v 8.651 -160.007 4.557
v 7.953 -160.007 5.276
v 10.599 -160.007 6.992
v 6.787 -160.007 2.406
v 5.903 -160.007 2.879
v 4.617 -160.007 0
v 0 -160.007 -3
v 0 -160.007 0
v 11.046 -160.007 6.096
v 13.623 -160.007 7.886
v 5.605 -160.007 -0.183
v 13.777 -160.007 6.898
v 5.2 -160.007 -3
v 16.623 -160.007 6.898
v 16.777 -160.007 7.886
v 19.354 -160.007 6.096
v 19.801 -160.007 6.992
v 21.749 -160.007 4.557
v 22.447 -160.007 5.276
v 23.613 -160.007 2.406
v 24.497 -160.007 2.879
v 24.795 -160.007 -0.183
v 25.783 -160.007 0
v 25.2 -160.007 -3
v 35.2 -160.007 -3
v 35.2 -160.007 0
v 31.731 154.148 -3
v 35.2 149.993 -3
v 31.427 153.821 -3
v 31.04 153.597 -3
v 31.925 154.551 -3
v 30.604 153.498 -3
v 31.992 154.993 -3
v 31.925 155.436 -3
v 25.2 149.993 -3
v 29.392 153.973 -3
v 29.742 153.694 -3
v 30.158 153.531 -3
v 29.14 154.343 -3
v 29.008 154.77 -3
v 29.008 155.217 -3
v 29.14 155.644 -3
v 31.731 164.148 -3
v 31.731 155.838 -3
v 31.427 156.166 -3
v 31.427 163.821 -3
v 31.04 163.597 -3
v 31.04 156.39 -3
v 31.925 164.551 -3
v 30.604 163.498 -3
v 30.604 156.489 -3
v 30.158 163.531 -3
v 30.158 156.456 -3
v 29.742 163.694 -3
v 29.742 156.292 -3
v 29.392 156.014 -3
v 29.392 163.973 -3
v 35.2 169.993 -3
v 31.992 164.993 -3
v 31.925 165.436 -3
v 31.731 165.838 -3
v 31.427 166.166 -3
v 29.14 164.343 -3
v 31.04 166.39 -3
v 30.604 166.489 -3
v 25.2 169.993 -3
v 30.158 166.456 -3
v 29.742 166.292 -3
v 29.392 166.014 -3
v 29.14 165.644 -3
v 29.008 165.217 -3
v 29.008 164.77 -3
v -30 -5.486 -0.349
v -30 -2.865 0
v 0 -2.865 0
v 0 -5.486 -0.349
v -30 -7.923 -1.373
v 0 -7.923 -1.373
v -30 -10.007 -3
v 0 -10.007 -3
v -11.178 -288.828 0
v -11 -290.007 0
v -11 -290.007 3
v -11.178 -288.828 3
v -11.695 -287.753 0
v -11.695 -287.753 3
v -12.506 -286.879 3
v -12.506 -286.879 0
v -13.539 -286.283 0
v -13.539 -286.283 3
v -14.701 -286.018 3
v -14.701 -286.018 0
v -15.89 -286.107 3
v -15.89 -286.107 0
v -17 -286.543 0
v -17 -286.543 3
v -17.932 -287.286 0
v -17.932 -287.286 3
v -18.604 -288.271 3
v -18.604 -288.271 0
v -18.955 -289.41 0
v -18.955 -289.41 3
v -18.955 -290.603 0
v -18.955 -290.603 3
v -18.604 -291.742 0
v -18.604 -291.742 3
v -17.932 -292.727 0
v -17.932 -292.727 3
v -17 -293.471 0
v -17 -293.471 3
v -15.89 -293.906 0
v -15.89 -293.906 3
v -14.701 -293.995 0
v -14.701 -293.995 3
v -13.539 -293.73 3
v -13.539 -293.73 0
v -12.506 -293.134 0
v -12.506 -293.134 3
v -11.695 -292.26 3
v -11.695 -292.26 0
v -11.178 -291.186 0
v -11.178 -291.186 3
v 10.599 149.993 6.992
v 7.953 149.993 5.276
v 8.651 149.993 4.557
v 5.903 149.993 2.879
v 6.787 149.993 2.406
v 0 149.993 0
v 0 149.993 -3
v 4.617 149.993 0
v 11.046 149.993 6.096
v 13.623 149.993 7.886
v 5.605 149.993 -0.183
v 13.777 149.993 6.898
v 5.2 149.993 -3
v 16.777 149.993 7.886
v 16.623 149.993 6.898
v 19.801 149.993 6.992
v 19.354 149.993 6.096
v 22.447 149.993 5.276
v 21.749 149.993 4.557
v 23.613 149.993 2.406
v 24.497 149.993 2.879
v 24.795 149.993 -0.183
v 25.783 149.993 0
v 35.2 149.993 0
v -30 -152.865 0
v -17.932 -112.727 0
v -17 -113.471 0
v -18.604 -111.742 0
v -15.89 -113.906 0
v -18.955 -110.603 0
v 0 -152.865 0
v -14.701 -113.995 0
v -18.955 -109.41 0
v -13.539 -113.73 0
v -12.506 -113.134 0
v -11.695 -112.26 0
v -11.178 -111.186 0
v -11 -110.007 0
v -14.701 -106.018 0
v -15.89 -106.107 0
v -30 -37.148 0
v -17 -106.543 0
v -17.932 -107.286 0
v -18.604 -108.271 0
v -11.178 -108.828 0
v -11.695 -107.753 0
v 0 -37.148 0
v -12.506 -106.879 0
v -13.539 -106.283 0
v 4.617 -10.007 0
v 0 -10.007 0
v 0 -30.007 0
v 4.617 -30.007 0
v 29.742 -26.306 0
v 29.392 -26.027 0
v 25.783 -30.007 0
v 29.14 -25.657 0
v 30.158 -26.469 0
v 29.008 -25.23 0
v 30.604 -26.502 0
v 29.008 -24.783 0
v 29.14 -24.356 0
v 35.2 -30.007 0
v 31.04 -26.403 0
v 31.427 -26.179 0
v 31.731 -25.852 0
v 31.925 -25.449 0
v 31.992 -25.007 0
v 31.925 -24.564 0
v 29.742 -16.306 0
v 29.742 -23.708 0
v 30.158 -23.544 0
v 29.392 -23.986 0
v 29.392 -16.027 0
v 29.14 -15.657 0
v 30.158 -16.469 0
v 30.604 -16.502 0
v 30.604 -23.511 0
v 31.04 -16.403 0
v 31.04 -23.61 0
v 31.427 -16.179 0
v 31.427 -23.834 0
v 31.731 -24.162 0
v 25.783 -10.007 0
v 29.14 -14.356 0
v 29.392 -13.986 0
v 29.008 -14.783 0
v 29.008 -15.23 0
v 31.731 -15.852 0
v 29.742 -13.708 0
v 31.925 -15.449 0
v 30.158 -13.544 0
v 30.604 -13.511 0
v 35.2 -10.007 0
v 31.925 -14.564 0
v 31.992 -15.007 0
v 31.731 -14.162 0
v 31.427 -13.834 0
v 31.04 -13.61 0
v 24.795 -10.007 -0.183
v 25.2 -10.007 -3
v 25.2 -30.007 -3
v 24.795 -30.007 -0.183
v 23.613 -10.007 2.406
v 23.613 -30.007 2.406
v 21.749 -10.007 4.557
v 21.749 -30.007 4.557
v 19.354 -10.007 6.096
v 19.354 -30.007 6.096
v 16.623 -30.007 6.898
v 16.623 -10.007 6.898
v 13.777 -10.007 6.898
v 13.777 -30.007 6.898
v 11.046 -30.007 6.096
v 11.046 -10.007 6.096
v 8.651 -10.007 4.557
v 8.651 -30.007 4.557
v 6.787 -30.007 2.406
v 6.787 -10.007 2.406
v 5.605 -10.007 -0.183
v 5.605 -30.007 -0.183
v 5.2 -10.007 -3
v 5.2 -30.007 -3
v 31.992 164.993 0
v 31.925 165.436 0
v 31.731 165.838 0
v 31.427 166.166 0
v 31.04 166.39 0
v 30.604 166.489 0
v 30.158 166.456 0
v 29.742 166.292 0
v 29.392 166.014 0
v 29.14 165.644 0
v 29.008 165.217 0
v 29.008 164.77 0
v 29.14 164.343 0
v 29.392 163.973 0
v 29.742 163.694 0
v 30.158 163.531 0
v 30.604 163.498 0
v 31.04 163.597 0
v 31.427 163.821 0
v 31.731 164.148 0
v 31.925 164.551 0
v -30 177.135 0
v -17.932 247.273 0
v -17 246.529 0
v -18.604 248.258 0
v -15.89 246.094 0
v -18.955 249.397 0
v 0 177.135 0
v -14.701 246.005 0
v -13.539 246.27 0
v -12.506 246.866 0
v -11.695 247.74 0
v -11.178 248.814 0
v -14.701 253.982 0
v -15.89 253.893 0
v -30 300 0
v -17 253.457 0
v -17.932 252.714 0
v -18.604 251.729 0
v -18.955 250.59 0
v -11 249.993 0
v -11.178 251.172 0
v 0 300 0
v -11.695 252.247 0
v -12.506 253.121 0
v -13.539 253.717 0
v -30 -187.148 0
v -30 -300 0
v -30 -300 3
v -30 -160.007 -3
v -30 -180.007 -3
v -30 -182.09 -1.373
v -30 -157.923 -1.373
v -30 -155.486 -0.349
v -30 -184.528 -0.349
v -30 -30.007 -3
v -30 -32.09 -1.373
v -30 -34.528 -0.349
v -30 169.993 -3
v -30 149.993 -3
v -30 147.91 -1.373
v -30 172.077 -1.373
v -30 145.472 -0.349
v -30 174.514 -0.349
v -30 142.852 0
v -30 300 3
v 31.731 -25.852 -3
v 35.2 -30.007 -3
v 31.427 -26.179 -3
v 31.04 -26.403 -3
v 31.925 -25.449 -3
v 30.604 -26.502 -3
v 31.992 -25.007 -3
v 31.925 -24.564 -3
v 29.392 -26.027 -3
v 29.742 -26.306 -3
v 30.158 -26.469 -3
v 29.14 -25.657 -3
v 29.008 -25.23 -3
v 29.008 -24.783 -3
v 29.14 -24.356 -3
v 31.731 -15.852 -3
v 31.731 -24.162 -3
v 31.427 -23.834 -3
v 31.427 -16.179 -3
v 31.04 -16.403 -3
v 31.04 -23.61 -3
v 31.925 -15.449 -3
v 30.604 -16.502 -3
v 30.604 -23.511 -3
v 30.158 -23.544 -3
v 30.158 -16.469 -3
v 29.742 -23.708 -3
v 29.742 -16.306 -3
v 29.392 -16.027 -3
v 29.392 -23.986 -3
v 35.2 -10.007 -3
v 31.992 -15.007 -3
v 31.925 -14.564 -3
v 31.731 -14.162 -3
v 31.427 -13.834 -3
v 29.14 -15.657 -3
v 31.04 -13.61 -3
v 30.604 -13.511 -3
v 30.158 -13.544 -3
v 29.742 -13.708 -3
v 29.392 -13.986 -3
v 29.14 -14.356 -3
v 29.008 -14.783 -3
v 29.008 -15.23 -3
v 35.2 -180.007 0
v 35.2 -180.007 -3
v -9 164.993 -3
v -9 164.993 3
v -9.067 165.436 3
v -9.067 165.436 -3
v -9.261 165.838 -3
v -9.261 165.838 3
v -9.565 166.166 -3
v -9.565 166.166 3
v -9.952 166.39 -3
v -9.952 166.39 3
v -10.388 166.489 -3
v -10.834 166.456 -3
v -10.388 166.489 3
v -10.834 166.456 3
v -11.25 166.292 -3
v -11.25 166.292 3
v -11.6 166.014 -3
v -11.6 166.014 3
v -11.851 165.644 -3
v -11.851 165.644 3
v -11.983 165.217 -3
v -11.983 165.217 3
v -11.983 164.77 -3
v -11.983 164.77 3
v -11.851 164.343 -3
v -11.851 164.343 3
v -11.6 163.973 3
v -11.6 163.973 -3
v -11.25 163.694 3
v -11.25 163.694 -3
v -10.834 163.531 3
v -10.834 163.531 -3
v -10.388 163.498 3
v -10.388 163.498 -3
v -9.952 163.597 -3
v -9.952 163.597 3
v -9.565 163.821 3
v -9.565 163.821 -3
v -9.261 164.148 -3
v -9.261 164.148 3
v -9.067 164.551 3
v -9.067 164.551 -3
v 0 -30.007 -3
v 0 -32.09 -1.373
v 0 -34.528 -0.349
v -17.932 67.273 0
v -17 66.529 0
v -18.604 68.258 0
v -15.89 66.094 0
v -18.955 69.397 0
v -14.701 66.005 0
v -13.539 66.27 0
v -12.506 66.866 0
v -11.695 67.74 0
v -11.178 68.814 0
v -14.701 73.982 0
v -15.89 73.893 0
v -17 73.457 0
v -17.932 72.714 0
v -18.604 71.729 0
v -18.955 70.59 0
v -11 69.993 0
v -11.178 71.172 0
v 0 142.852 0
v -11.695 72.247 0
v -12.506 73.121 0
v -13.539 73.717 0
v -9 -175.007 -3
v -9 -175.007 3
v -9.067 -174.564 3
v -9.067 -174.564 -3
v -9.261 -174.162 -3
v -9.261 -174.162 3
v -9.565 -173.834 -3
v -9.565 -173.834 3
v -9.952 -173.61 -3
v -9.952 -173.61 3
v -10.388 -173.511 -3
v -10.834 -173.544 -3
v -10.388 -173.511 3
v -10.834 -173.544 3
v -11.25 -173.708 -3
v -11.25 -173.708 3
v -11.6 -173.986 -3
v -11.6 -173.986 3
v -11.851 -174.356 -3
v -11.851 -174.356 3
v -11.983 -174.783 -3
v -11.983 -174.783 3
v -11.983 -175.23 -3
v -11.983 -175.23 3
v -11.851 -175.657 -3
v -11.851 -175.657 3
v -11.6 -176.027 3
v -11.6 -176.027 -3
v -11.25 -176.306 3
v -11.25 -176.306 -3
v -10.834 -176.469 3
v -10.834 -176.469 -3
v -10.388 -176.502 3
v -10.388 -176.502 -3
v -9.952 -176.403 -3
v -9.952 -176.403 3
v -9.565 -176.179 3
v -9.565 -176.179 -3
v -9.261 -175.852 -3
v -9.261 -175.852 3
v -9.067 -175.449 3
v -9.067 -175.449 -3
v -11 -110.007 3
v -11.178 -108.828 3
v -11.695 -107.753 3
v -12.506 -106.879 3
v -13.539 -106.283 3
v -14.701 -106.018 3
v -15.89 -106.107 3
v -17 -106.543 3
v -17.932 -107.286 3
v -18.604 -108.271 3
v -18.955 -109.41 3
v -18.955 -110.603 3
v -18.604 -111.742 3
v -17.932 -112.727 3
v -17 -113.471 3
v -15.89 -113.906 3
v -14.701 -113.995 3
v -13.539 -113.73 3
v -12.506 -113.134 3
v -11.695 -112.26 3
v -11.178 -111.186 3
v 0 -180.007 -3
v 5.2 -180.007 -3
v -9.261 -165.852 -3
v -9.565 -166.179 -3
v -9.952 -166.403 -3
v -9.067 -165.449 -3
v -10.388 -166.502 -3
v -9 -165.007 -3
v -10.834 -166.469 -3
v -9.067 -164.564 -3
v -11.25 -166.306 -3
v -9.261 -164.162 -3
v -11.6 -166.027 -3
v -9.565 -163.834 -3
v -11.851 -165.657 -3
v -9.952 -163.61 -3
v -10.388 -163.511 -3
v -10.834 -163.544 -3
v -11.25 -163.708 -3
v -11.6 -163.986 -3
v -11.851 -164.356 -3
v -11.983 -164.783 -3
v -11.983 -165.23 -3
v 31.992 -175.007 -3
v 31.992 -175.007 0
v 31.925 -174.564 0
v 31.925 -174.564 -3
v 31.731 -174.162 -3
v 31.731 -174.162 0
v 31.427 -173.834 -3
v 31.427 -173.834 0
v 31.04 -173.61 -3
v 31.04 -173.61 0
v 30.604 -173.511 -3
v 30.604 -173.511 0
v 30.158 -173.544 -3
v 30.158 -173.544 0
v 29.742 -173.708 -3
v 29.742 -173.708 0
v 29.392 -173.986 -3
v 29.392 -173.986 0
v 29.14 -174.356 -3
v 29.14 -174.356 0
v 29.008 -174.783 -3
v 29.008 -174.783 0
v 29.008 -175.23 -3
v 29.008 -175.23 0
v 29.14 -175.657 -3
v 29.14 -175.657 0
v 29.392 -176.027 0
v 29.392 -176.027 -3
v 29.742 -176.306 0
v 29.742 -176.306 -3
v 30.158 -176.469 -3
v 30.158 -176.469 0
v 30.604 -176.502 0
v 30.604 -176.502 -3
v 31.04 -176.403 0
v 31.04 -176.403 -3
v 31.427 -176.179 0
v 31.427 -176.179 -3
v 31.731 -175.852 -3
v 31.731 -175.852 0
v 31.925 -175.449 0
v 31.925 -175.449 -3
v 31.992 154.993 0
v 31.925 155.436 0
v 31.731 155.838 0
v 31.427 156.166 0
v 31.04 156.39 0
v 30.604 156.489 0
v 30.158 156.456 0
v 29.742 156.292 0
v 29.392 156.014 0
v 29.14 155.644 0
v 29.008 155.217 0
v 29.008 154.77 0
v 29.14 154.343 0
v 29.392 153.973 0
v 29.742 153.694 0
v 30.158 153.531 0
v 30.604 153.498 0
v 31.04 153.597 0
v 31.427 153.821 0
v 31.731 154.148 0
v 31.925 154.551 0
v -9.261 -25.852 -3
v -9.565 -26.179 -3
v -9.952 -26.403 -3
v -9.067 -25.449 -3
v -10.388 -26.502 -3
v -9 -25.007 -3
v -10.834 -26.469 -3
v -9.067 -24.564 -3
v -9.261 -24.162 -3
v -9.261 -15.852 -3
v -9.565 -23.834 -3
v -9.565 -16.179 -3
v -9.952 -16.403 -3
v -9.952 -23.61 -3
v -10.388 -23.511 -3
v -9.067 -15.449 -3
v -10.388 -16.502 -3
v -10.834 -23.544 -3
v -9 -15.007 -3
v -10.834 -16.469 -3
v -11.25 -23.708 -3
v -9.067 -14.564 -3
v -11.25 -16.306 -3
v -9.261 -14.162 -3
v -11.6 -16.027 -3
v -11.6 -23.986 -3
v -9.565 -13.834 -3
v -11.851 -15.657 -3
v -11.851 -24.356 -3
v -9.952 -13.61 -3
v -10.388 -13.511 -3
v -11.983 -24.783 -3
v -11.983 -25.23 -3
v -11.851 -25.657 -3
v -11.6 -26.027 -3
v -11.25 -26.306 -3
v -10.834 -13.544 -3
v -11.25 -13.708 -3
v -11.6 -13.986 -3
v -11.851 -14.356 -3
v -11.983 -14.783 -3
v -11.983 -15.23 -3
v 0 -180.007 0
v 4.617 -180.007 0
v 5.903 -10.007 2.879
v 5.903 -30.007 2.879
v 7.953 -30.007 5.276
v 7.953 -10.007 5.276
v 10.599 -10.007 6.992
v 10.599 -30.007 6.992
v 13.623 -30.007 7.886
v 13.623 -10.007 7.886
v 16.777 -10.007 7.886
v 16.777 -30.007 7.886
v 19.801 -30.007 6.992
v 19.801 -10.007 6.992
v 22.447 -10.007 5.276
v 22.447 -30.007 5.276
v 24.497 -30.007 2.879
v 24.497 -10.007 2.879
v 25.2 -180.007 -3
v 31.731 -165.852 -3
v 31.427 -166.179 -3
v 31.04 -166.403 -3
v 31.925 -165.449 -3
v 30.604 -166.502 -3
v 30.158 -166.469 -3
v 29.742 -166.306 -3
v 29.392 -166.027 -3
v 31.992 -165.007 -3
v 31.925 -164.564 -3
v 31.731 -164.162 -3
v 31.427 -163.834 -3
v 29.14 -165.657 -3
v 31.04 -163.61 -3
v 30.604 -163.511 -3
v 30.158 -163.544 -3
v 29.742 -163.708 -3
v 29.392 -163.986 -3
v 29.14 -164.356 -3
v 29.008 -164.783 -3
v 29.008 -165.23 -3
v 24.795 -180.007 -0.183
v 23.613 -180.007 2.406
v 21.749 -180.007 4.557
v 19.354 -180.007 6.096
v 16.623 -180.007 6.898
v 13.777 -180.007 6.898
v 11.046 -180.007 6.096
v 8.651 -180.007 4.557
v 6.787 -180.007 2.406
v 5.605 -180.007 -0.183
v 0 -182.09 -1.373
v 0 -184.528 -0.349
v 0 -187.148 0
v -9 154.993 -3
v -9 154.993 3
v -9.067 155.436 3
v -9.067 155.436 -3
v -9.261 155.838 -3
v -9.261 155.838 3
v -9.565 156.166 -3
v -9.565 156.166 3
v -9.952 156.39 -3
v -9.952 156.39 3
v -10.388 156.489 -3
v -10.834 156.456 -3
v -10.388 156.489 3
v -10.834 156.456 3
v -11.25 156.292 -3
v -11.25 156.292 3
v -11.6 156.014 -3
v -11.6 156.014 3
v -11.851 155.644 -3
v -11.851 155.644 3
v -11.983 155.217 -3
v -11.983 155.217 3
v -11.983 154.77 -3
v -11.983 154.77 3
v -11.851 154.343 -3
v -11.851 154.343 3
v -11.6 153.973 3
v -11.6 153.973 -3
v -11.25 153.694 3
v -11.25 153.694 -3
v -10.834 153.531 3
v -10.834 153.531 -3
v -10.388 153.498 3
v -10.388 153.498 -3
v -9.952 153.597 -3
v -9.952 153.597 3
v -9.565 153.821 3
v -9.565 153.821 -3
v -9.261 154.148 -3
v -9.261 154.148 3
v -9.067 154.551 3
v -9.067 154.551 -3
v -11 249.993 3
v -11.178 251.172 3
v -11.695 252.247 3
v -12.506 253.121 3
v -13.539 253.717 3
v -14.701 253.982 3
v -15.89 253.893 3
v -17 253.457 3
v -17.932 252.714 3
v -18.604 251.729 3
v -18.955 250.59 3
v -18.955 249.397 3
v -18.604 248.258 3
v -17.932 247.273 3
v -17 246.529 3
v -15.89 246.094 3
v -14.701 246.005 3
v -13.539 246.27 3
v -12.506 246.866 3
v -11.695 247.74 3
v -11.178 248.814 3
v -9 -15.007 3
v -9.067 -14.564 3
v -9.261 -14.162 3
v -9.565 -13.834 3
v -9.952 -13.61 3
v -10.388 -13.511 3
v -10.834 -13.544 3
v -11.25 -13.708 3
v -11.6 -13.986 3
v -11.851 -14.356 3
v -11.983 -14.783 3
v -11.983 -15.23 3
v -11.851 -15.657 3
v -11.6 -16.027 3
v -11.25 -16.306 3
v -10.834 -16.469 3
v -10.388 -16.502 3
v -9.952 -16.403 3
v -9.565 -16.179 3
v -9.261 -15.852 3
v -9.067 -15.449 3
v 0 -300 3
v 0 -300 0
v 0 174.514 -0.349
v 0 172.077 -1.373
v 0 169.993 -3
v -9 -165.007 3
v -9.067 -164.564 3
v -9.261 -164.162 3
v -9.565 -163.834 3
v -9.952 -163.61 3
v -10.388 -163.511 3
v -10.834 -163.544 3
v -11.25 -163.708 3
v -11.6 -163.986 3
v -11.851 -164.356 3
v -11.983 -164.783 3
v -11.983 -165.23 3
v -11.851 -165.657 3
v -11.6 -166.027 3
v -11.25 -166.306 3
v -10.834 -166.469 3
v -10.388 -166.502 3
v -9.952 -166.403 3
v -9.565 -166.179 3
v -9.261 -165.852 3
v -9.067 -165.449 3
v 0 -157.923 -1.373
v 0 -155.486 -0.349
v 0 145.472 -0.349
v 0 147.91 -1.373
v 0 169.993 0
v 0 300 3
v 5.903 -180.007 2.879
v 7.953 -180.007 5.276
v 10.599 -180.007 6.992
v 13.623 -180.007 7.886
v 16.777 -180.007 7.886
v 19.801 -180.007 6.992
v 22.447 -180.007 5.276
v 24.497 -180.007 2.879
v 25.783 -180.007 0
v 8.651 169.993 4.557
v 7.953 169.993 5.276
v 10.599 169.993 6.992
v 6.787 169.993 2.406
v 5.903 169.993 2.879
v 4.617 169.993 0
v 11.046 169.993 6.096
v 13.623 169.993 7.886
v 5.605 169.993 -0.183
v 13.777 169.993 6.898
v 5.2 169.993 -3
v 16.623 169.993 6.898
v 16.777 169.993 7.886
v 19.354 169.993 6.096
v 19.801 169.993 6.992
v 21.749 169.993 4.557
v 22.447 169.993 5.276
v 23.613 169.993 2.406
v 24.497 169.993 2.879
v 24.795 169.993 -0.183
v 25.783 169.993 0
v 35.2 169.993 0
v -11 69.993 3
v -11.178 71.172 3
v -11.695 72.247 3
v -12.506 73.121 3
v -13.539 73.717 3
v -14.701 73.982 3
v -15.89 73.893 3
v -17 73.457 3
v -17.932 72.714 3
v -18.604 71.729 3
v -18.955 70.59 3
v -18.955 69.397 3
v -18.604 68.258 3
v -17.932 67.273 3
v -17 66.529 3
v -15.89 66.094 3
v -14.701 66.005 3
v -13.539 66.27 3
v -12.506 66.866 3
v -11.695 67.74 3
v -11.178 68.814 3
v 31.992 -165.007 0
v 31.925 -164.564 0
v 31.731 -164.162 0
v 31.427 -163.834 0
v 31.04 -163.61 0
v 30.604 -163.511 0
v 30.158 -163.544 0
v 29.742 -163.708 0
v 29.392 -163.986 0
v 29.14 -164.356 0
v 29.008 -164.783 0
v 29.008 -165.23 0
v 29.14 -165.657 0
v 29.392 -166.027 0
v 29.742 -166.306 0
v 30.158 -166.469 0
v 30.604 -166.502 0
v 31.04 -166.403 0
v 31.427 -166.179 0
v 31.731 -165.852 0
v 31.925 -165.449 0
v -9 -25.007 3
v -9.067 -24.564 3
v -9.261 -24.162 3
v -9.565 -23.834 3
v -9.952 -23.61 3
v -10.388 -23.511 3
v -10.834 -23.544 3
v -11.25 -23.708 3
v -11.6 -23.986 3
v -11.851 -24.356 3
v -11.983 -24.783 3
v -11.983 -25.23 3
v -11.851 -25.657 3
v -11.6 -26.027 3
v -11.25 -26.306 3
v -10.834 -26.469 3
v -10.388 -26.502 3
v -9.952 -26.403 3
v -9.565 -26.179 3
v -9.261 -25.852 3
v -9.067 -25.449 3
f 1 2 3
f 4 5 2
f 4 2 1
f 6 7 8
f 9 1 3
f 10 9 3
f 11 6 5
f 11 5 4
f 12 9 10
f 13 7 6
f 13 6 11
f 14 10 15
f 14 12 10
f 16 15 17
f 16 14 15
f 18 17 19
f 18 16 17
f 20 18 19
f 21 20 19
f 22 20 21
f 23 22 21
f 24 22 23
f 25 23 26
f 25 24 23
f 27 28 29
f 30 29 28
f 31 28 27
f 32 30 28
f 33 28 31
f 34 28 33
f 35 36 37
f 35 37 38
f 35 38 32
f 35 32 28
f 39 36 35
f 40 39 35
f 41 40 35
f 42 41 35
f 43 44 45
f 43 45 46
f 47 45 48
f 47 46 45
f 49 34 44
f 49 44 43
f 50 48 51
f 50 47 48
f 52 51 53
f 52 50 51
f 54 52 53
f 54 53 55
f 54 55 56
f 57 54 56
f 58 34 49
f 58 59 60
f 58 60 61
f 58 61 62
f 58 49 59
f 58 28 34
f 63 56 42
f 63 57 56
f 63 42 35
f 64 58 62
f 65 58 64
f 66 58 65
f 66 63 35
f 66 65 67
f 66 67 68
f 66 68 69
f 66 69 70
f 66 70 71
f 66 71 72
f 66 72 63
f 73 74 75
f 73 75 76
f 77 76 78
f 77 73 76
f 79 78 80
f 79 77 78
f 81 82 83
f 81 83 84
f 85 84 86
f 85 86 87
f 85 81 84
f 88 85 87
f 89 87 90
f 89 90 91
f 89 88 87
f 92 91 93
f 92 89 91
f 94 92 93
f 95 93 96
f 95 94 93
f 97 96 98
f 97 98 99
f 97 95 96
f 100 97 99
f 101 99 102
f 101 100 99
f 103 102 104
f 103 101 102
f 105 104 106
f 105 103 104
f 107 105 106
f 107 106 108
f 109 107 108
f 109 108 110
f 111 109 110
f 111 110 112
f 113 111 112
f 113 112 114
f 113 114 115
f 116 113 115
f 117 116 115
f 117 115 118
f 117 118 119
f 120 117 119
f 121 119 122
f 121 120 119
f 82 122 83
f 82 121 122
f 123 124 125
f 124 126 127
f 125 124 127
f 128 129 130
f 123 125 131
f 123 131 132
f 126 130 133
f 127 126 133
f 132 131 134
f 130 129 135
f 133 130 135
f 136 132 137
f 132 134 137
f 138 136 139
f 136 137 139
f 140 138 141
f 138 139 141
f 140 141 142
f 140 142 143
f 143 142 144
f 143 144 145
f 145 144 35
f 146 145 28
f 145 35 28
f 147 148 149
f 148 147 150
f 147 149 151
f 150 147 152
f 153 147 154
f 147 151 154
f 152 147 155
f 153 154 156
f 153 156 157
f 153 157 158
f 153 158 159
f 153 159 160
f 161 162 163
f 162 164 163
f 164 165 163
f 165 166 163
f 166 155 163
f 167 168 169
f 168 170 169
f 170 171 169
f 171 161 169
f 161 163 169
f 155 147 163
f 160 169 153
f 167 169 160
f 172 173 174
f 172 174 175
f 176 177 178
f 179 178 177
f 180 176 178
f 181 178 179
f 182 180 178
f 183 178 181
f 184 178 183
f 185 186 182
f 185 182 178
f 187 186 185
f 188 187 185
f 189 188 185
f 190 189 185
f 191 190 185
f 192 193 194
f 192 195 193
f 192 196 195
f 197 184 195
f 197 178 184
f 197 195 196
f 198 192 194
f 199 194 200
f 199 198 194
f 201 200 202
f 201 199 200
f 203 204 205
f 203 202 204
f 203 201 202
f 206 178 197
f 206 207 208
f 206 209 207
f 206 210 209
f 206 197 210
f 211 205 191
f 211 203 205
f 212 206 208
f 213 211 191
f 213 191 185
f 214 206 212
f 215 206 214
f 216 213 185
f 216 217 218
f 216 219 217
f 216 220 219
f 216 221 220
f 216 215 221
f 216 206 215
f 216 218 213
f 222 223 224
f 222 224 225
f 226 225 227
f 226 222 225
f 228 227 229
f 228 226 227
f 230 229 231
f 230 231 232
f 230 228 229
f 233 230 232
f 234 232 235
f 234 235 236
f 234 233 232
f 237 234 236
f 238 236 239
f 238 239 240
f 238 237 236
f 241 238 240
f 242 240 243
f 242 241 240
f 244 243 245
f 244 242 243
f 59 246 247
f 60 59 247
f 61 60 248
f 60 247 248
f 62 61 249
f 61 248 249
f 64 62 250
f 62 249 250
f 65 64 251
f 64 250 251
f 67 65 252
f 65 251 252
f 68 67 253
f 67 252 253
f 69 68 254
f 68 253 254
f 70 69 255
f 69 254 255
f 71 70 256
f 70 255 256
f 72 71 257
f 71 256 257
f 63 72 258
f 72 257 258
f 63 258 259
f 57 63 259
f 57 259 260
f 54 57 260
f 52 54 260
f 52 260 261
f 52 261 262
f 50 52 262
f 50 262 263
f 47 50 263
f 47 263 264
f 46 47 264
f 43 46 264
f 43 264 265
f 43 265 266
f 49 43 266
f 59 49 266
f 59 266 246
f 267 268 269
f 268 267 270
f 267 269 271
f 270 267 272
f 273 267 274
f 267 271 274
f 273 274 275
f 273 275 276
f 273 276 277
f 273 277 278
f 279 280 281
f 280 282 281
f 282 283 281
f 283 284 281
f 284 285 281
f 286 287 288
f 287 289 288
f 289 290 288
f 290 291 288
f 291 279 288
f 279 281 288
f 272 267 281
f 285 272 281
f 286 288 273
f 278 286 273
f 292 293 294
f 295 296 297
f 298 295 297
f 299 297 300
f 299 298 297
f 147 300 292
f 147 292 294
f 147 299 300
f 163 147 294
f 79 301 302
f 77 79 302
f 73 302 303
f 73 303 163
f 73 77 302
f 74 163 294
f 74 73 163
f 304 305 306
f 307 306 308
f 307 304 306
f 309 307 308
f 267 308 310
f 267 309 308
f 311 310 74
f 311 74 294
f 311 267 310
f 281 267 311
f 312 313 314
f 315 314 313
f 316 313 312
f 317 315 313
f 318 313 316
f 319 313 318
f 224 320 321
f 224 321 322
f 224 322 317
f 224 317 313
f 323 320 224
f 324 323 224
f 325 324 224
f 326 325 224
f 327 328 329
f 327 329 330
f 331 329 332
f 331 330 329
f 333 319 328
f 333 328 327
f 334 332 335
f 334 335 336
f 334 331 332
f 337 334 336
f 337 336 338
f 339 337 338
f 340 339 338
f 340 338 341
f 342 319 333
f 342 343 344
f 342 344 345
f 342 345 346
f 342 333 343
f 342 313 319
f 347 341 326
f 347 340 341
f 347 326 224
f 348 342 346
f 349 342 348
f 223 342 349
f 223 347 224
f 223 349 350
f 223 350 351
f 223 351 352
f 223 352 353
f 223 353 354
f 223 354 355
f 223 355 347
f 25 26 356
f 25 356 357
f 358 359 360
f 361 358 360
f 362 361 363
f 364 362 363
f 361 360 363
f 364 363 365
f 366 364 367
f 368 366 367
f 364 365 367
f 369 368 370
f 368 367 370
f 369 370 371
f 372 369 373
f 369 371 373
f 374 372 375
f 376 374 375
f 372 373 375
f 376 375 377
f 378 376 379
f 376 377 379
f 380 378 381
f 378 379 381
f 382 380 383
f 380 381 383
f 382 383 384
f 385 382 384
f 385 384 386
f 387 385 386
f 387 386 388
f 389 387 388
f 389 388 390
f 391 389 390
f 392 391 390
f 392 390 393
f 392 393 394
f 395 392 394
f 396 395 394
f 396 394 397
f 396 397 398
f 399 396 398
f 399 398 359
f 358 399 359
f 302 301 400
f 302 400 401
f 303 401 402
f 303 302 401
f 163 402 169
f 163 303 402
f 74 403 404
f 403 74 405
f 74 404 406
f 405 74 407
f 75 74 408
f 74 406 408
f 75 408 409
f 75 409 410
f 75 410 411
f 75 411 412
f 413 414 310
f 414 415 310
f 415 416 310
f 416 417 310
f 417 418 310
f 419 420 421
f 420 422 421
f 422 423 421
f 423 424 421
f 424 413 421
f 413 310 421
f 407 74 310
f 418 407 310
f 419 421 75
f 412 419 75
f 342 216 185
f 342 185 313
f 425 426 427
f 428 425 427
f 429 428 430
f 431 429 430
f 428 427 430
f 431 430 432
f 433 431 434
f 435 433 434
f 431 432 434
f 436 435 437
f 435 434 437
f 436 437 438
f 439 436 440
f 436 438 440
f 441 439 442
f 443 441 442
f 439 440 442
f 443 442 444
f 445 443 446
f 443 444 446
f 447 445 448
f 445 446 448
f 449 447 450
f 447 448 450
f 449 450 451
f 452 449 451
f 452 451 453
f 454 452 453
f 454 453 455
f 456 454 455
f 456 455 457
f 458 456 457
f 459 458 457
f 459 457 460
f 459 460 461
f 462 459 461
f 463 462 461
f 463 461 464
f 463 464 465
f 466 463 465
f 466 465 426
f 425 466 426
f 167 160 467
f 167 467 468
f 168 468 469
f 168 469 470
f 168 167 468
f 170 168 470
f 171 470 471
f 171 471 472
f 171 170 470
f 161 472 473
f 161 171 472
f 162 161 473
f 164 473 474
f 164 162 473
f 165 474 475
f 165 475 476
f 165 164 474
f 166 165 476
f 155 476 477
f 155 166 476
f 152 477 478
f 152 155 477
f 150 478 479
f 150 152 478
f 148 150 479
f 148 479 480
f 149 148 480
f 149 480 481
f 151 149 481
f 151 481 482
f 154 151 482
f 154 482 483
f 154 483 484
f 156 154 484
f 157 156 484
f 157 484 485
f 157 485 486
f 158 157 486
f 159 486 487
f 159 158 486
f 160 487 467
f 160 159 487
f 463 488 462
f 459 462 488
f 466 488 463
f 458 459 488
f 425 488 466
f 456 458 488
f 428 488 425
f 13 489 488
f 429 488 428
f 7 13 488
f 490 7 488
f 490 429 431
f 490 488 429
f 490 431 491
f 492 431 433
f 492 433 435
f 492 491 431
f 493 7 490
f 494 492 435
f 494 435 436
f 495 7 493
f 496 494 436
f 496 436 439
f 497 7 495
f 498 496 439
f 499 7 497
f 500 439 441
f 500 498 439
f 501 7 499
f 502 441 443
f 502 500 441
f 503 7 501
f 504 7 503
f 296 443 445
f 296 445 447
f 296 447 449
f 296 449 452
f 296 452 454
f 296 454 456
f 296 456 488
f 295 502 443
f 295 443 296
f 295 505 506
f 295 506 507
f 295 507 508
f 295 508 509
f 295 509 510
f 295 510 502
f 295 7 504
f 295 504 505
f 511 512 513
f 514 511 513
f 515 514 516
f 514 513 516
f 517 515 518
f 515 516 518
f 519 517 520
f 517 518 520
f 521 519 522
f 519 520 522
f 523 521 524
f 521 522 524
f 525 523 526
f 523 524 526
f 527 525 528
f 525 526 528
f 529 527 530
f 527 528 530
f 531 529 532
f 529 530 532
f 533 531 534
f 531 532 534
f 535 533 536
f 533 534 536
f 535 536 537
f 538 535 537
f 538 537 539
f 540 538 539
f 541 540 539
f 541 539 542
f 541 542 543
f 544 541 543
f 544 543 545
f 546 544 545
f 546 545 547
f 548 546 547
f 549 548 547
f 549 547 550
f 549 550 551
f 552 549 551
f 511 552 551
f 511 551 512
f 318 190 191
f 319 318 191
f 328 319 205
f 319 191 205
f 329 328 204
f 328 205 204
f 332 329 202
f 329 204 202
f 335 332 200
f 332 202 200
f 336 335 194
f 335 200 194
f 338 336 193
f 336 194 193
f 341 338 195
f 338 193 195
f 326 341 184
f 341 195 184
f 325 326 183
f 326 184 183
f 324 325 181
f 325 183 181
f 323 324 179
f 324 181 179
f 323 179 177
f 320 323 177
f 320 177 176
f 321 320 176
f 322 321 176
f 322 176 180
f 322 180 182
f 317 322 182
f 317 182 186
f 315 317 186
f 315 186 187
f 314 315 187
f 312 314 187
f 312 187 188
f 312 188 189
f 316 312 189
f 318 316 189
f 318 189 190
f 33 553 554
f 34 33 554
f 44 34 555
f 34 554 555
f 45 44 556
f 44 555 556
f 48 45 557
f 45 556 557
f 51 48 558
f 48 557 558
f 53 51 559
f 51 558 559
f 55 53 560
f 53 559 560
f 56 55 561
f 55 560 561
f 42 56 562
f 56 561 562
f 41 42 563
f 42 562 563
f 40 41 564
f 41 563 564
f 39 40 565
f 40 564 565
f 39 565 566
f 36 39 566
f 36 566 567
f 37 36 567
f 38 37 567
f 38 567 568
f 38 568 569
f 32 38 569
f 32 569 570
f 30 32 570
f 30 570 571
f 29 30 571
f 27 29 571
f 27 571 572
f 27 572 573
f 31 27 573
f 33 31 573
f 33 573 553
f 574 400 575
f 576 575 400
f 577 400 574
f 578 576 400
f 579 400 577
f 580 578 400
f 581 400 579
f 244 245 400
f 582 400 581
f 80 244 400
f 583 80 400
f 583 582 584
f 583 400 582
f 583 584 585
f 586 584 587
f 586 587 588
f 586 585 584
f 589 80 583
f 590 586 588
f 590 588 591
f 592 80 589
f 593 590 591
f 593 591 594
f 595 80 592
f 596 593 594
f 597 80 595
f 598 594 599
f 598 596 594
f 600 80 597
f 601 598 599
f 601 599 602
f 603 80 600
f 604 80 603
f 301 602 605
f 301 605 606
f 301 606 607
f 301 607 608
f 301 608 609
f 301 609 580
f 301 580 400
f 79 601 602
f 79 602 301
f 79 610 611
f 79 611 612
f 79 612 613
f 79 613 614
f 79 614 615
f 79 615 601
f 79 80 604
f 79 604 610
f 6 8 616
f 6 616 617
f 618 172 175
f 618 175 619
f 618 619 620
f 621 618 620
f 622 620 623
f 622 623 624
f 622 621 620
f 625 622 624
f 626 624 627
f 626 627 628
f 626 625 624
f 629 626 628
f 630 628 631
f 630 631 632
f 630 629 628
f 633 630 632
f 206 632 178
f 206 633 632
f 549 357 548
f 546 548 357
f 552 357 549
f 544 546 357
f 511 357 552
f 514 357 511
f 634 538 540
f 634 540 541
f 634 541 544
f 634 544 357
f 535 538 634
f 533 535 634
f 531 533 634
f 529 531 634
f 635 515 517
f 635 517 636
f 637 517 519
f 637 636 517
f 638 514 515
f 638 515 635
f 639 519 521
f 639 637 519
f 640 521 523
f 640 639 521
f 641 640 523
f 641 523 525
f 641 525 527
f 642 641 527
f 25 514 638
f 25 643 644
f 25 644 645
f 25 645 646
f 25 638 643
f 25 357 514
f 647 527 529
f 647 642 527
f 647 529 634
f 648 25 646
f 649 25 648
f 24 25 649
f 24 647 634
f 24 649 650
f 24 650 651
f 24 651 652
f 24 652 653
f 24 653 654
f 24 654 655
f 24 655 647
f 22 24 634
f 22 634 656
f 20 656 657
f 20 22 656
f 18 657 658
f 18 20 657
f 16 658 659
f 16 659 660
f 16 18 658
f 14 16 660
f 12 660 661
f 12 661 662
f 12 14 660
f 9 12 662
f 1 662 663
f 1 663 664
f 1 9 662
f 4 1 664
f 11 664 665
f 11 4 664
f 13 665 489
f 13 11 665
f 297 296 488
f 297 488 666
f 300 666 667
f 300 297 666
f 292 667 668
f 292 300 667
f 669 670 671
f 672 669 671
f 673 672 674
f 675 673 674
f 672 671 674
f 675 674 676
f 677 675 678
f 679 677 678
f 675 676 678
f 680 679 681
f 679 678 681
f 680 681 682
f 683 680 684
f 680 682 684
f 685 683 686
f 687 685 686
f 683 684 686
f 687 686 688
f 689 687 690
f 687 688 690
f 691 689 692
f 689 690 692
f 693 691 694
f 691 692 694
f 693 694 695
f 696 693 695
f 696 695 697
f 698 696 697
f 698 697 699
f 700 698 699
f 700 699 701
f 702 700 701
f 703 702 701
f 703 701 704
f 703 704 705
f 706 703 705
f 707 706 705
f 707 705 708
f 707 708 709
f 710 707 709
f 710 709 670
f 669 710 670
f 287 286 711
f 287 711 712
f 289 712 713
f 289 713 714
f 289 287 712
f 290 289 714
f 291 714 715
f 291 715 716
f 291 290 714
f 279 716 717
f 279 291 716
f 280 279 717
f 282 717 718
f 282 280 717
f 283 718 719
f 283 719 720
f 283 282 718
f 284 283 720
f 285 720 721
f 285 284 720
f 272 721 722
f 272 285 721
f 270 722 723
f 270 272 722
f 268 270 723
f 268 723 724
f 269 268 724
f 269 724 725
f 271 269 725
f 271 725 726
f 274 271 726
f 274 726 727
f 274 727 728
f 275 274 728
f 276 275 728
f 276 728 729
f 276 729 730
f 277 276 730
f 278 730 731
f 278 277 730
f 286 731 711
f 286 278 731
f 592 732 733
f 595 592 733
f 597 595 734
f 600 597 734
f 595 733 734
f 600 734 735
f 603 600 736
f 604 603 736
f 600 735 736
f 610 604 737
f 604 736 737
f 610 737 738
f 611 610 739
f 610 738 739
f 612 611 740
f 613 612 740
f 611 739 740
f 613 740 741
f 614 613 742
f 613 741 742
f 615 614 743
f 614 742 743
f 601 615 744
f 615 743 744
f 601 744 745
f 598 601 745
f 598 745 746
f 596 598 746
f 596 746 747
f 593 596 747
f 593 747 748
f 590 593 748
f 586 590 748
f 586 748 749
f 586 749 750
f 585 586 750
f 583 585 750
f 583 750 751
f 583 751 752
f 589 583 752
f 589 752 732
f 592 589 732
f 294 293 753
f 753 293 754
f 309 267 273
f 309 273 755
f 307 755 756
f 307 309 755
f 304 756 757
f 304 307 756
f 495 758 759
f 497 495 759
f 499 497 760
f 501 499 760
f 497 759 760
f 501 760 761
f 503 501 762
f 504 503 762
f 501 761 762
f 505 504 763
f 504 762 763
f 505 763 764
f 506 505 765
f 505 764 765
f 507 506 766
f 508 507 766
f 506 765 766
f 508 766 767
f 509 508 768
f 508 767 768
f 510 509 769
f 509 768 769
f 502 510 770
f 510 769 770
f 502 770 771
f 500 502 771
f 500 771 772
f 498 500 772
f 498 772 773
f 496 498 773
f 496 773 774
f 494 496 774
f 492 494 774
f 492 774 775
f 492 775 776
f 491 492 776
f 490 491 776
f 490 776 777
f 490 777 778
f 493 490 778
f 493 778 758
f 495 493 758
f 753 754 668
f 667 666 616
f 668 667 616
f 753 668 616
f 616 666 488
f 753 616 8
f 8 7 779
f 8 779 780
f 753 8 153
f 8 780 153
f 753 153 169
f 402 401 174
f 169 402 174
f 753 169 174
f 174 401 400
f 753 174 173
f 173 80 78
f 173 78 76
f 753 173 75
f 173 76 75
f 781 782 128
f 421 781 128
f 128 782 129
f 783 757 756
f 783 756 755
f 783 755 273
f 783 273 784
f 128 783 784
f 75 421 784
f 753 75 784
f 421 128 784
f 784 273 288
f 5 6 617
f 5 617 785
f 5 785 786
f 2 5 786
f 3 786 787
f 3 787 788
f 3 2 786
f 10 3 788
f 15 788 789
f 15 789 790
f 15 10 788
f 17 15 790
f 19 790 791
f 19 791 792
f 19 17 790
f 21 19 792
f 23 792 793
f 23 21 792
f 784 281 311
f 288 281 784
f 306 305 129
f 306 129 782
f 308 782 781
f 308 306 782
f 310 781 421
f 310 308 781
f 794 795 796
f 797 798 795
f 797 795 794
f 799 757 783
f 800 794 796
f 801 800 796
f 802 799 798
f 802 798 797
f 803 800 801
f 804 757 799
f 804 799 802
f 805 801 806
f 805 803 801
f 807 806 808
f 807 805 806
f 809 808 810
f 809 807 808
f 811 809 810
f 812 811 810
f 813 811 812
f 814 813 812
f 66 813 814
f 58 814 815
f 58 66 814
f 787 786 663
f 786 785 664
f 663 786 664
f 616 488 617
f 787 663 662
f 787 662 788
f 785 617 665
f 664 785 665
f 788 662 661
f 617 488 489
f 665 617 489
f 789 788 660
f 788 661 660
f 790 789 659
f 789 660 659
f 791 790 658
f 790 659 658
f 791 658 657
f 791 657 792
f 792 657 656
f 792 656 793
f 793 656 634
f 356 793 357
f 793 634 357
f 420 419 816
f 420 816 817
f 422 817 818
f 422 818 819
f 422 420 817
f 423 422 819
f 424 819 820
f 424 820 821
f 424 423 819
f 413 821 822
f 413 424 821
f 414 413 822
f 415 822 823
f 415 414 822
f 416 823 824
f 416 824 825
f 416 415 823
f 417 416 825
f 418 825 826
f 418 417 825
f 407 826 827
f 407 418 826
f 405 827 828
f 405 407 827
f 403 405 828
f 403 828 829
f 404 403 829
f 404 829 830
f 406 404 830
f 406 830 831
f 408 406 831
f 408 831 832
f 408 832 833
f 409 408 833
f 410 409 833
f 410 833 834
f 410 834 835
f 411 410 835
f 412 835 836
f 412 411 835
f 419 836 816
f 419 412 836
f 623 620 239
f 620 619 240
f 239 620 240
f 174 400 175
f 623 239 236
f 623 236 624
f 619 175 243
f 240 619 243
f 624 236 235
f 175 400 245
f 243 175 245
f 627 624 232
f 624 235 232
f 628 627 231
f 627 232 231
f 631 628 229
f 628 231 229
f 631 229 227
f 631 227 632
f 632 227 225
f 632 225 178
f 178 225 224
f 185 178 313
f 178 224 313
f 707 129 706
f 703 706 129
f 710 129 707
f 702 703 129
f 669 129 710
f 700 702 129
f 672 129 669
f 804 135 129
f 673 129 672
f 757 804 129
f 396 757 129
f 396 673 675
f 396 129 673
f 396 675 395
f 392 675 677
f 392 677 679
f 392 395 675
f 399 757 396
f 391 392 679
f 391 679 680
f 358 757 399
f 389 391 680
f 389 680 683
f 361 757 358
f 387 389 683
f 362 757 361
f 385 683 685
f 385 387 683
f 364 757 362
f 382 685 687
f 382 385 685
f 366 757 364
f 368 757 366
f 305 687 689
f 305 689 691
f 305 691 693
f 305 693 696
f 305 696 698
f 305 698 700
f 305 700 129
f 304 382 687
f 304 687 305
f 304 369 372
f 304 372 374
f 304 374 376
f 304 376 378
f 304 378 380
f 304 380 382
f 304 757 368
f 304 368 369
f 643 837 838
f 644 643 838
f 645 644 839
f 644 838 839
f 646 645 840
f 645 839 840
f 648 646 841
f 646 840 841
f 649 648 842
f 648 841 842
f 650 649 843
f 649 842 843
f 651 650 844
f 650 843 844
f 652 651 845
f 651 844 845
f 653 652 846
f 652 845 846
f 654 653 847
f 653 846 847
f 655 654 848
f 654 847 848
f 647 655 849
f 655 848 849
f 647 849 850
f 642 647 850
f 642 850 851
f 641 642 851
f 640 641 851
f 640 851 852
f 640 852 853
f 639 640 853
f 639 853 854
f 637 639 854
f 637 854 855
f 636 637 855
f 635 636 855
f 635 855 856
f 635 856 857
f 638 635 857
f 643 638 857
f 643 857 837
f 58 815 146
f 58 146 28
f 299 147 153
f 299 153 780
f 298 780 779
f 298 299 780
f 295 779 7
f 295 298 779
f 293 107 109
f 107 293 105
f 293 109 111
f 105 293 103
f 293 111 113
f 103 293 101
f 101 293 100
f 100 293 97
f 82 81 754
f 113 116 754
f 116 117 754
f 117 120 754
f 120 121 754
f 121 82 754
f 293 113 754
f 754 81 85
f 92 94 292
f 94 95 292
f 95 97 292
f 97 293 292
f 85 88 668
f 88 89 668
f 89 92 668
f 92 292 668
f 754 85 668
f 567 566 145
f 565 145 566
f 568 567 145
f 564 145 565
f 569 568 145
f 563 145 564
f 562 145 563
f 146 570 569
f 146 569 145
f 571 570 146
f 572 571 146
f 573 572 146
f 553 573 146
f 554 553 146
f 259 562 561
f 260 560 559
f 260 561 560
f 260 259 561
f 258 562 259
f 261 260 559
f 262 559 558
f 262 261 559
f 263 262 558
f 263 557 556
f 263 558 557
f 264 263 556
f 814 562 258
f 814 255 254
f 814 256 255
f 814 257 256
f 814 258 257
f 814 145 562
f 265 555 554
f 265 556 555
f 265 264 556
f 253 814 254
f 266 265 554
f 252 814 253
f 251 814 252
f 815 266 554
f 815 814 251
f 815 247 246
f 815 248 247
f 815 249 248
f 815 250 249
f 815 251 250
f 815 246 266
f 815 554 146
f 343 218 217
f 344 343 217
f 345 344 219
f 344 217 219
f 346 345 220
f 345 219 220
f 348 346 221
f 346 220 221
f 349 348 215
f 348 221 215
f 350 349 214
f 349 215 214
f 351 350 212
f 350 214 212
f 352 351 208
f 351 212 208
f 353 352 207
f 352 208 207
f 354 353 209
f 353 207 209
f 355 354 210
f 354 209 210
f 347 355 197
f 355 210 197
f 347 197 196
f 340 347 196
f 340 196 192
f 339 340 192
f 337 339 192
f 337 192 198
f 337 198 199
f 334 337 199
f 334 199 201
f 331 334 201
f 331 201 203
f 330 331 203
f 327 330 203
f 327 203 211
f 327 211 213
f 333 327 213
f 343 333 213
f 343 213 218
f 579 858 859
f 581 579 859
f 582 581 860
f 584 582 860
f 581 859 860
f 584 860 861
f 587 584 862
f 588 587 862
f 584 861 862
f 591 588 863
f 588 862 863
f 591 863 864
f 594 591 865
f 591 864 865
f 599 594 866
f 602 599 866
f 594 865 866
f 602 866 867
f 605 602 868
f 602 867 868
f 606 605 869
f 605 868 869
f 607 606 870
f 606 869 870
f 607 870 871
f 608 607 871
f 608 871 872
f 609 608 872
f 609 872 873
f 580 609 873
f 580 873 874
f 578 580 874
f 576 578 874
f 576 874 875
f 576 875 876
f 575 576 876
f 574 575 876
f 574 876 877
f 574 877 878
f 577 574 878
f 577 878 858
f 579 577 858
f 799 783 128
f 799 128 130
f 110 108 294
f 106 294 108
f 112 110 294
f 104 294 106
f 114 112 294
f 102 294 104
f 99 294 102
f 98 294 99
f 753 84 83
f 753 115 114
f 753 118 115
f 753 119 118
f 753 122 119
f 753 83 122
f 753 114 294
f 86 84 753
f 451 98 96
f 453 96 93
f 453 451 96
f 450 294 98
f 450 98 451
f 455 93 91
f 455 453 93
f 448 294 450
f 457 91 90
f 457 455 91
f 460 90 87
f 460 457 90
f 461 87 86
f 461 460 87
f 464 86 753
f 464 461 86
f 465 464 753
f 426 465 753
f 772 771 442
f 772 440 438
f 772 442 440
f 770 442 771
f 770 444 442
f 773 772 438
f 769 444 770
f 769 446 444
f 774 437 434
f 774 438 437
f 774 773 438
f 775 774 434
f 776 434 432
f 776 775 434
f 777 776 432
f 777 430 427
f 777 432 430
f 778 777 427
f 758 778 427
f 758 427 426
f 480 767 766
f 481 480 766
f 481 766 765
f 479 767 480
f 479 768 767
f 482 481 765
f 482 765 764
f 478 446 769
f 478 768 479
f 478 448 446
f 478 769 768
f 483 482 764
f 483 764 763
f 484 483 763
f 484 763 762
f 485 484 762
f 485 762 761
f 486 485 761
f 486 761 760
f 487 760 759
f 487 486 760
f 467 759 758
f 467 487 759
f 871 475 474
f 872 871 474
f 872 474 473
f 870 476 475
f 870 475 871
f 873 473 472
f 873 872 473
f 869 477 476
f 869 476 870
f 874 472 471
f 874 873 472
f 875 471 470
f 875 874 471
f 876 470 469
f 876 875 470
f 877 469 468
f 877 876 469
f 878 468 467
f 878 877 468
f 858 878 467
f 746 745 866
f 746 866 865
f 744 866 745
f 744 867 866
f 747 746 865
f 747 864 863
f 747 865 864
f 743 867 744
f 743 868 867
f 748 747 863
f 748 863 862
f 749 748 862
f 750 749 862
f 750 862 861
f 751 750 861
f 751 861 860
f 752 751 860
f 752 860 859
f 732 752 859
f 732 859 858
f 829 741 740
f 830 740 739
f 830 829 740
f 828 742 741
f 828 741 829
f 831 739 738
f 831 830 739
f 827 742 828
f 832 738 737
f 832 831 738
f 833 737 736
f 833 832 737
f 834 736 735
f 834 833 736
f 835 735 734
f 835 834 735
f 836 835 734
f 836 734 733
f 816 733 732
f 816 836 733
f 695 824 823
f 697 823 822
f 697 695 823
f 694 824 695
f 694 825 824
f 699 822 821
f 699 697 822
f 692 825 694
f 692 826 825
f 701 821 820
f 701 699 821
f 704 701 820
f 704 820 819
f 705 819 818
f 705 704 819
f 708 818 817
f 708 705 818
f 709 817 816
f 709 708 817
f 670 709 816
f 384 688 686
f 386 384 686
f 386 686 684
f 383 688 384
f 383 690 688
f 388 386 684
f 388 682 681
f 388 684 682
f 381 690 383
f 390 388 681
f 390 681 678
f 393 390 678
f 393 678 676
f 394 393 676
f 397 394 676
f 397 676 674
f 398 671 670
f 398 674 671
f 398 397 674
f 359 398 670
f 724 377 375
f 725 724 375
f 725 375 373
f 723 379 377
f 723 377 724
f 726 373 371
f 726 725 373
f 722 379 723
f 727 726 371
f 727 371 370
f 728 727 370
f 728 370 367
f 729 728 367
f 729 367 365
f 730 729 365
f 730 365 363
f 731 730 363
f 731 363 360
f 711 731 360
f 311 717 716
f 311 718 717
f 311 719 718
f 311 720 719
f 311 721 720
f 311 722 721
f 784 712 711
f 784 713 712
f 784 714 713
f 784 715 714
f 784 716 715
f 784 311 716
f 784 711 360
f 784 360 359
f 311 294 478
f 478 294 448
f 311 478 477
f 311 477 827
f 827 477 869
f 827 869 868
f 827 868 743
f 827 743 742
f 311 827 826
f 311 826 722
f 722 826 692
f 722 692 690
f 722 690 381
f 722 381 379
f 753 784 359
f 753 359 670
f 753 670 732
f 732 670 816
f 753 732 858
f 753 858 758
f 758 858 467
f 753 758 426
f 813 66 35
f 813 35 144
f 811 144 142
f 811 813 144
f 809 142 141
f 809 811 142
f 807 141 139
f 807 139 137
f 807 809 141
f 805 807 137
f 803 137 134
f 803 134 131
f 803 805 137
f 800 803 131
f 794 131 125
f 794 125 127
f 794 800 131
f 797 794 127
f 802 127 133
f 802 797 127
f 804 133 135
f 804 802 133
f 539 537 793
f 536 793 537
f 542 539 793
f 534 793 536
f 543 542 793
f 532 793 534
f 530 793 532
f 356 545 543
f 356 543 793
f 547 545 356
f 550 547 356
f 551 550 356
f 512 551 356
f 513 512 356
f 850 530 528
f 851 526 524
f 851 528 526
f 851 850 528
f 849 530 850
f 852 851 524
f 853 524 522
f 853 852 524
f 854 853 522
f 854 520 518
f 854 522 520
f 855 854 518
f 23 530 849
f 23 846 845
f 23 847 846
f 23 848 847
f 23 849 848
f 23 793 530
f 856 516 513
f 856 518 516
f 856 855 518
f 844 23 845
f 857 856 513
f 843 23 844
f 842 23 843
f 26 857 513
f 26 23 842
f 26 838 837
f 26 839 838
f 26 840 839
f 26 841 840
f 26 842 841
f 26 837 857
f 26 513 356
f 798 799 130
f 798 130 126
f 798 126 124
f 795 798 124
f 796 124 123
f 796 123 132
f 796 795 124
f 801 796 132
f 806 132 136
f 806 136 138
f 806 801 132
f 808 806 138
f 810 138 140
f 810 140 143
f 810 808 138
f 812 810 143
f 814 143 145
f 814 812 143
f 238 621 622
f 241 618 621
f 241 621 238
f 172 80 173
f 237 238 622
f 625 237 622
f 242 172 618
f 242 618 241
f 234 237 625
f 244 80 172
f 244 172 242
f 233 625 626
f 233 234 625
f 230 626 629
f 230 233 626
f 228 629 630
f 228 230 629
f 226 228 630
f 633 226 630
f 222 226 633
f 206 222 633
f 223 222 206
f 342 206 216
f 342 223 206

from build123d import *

# Parameters (mm, degrees)
SKETCH_1_W          = 30
SKETCH_1_H          = 300
SKETCH_1_R          = 4
EXTRUDE_1_DEPTH     = 3
EXTRUDE_2_DEPTH     = 10
EXTRUDE_3_DEPTH     = 10
EXTRUDE_4_DEPTH     = 10
SKETCH_13_R         = 1.5
CUT_EXTRUDE_1_DEPTH = 20
FILLET_1_R          = 10


with BuildPart() as part:
    # 草图1 → 凸台-拉伸1 (new body)
    # profile 1 of 2: a face of its own
    with BuildSketch(Plane.XY):
        with Locations((-15, 150)):
            Rectangle(SKETCH_1_W, SKETCH_1_H)
        with Locations((-15, 69.99339056)):
            Circle(SKETCH_1_R, mode=Mode.SUBTRACT)
        with Locations((-15, 249.99339056)):
            Circle(SKETCH_1_R, mode=Mode.SUBTRACT)
    # profile 2 of 2: a face of its own
    with BuildSketch(Plane.XY):
        with Locations((-15, -150)):
            Rectangle(SKETCH_1_W, SKETCH_1_H)
        with Locations((-15, -290.00660944)):
            Circle(SKETCH_1_R, mode=Mode.SUBTRACT)
        with Locations((-15, -110.00660944)):
            Circle(SKETCH_1_R, mode=Mode.SUBTRACT)
    extrude(amount=EXTRUDE_1_DEPTH)

    # 草图10 → 凸台-拉伸2 (add, symmetric)
    with BuildSketch(Plane(origin=(0, -20.00660944, 0), x_dir=(1, 0, 0), z_dir=(0, 1, 0))):
        with BuildLine():
            Line((-30, 0), (4.616994756, 0))
            ThreePointArc((4.616994756, 0), (15.2, -8), (25.783005244, 0))
            Line((25.783005244, 0), (35.2, 0))
            Line((35.2, 0), (35.2, 3))
            Line((35.2, 3), (25.2, 3))
            ThreePointArc((25.2, 3), (15.2, -7), (5.2, 3))
            Line((5.2, 3), (-30, 3))
            Line((-30, 3), (-30, 0))
        make_face()
    extrude(amount=EXTRUDE_2_DEPTH, both=True)

    # 草图11 → 凸台-拉伸3 (add, symmetric)
    with BuildSketch(Plane(origin=(0, 159.99339056, 0), x_dir=(1, 0, 0), z_dir=(0, 1, 0))):
        with BuildLine():
            Line((-30, 0), (4.616994756, 0))
            ThreePointArc((4.616994756, 0), (15.2, -8), (25.783005244, 0))
            Line((25.783005244, 0), (35.2, 0))
            Line((35.2, 0), (35.2, 3))
            Line((35.2, 3), (25.2, 3))
            ThreePointArc((25.2, 3), (15.2, -7), (5.2, 3))
            Line((5.2, 3), (-30, 3))
            Line((-30, 3), (-30, 0))
        make_face()
    extrude(amount=EXTRUDE_3_DEPTH, both=True)

    # 草图12 → 凸台-拉伸4 (add, symmetric)
    with BuildSketch(Plane(origin=(0, -170.00660944, 0), x_dir=(1, 0, 0), z_dir=(0, 1, 0))):
        with BuildLine():
            Line((-30, 0), (4.616994756, 0))
            ThreePointArc((4.616994756, 0), (15.2, -8), (25.783005244, 0))
            Line((25.783005244, 0), (35.2, 0))
            Line((35.2, 0), (35.2, 3))
            Line((35.2, 3), (25.2, 3))
            ThreePointArc((25.2, 3), (15.2, -7), (5.2, 3))
            Line((5.2, 3), (-30, 3))
            Line((-30, 3), (-30, 0))
        make_face()
    extrude(amount=EXTRUDE_4_DEPTH, both=True)

    # 草图13 → 切除-拉伸1 (cut)
    with BuildSketch(Plane.XY.offset(3)):
        with Locations((30.491502622, 164.99339056)):
            Circle(SKETCH_13_R)
        with Locations((30.491502622, 154.99339056)):
            Circle(SKETCH_13_R)
        with Locations((-10.5, 154.99339056)):
            Circle(SKETCH_13_R)
        with Locations((-10.5, 164.99339056)):
            Circle(SKETCH_13_R)
        with Locations((30.491502622, -15.00660944)):
            Circle(SKETCH_13_R)
        with Locations((30.491502622, -25.00660944)):
            Circle(SKETCH_13_R)
        with Locations((-10.5, -25.00660944)):
            Circle(SKETCH_13_R)
        with Locations((-10.5, -15.00660944)):
            Circle(SKETCH_13_R)
        with Locations((30.491502622, -165.00660944)):
            Circle(SKETCH_13_R)
        with Locations((30.491502622, -175.00660944)):
            Circle(SKETCH_13_R)
        with Locations((-10.5, -175.00660944)):
            Circle(SKETCH_13_R)
        with Locations((-10.5, -165.00660944)):
            Circle(SKETCH_13_R)
    extrude(amount=-CUT_EXTRUDE_1_DEPTH, mode=Mode.SUBTRACT)

    # 圆角1
    # the kernel refuses this fillet: 10 mm, written as the material it adds along each edge
    with BuildSketch(Plane(origin=(-30, -160.00660944, 0), x_dir=(0, 1, 0), z_dir=(1, 0, 0)), Plane(origin=(-30, -10.00660944, 0), x_dir=(0, 1, 0), z_dir=(1, 0, 0)), Plane(origin=(-30, 169.99339056, 0), x_dir=(0, 1, 0), z_dir=(1, 0, 0))) as fillet_1_piece_1:
        with BuildLine():
            CenterArc((7.141428429, -10), FILLET_1_R, 90, 45.572995999)
            Line((0, -3), (0, 0))
            Line((0, 0), (7.141428429, 0))
        make_face()
    extrude(amount=30)
    with BuildSketch(Plane(origin=(-30, -180.00660944, 0), x_dir=(0, -1, 0), z_dir=(1, 0, 0)), Plane(origin=(-30, -30.00660944, 0), x_dir=(0, -1, 0), z_dir=(1, 0, 0)), Plane(origin=(-30, 149.99339056, 0), x_dir=(0, -1, 0), z_dir=(1, 0, 0))) as fillet_1_piece_2:
        with BuildLine():
            CenterArc((7.141428429, 10), FILLET_1_R, 224.427004001, 45.572995999)
            Line((0, 3), (0, 0))
            Line((0, 0), (7.141428429, 0))
        make_face()
    extrude(amount=30)


solid = part.part
